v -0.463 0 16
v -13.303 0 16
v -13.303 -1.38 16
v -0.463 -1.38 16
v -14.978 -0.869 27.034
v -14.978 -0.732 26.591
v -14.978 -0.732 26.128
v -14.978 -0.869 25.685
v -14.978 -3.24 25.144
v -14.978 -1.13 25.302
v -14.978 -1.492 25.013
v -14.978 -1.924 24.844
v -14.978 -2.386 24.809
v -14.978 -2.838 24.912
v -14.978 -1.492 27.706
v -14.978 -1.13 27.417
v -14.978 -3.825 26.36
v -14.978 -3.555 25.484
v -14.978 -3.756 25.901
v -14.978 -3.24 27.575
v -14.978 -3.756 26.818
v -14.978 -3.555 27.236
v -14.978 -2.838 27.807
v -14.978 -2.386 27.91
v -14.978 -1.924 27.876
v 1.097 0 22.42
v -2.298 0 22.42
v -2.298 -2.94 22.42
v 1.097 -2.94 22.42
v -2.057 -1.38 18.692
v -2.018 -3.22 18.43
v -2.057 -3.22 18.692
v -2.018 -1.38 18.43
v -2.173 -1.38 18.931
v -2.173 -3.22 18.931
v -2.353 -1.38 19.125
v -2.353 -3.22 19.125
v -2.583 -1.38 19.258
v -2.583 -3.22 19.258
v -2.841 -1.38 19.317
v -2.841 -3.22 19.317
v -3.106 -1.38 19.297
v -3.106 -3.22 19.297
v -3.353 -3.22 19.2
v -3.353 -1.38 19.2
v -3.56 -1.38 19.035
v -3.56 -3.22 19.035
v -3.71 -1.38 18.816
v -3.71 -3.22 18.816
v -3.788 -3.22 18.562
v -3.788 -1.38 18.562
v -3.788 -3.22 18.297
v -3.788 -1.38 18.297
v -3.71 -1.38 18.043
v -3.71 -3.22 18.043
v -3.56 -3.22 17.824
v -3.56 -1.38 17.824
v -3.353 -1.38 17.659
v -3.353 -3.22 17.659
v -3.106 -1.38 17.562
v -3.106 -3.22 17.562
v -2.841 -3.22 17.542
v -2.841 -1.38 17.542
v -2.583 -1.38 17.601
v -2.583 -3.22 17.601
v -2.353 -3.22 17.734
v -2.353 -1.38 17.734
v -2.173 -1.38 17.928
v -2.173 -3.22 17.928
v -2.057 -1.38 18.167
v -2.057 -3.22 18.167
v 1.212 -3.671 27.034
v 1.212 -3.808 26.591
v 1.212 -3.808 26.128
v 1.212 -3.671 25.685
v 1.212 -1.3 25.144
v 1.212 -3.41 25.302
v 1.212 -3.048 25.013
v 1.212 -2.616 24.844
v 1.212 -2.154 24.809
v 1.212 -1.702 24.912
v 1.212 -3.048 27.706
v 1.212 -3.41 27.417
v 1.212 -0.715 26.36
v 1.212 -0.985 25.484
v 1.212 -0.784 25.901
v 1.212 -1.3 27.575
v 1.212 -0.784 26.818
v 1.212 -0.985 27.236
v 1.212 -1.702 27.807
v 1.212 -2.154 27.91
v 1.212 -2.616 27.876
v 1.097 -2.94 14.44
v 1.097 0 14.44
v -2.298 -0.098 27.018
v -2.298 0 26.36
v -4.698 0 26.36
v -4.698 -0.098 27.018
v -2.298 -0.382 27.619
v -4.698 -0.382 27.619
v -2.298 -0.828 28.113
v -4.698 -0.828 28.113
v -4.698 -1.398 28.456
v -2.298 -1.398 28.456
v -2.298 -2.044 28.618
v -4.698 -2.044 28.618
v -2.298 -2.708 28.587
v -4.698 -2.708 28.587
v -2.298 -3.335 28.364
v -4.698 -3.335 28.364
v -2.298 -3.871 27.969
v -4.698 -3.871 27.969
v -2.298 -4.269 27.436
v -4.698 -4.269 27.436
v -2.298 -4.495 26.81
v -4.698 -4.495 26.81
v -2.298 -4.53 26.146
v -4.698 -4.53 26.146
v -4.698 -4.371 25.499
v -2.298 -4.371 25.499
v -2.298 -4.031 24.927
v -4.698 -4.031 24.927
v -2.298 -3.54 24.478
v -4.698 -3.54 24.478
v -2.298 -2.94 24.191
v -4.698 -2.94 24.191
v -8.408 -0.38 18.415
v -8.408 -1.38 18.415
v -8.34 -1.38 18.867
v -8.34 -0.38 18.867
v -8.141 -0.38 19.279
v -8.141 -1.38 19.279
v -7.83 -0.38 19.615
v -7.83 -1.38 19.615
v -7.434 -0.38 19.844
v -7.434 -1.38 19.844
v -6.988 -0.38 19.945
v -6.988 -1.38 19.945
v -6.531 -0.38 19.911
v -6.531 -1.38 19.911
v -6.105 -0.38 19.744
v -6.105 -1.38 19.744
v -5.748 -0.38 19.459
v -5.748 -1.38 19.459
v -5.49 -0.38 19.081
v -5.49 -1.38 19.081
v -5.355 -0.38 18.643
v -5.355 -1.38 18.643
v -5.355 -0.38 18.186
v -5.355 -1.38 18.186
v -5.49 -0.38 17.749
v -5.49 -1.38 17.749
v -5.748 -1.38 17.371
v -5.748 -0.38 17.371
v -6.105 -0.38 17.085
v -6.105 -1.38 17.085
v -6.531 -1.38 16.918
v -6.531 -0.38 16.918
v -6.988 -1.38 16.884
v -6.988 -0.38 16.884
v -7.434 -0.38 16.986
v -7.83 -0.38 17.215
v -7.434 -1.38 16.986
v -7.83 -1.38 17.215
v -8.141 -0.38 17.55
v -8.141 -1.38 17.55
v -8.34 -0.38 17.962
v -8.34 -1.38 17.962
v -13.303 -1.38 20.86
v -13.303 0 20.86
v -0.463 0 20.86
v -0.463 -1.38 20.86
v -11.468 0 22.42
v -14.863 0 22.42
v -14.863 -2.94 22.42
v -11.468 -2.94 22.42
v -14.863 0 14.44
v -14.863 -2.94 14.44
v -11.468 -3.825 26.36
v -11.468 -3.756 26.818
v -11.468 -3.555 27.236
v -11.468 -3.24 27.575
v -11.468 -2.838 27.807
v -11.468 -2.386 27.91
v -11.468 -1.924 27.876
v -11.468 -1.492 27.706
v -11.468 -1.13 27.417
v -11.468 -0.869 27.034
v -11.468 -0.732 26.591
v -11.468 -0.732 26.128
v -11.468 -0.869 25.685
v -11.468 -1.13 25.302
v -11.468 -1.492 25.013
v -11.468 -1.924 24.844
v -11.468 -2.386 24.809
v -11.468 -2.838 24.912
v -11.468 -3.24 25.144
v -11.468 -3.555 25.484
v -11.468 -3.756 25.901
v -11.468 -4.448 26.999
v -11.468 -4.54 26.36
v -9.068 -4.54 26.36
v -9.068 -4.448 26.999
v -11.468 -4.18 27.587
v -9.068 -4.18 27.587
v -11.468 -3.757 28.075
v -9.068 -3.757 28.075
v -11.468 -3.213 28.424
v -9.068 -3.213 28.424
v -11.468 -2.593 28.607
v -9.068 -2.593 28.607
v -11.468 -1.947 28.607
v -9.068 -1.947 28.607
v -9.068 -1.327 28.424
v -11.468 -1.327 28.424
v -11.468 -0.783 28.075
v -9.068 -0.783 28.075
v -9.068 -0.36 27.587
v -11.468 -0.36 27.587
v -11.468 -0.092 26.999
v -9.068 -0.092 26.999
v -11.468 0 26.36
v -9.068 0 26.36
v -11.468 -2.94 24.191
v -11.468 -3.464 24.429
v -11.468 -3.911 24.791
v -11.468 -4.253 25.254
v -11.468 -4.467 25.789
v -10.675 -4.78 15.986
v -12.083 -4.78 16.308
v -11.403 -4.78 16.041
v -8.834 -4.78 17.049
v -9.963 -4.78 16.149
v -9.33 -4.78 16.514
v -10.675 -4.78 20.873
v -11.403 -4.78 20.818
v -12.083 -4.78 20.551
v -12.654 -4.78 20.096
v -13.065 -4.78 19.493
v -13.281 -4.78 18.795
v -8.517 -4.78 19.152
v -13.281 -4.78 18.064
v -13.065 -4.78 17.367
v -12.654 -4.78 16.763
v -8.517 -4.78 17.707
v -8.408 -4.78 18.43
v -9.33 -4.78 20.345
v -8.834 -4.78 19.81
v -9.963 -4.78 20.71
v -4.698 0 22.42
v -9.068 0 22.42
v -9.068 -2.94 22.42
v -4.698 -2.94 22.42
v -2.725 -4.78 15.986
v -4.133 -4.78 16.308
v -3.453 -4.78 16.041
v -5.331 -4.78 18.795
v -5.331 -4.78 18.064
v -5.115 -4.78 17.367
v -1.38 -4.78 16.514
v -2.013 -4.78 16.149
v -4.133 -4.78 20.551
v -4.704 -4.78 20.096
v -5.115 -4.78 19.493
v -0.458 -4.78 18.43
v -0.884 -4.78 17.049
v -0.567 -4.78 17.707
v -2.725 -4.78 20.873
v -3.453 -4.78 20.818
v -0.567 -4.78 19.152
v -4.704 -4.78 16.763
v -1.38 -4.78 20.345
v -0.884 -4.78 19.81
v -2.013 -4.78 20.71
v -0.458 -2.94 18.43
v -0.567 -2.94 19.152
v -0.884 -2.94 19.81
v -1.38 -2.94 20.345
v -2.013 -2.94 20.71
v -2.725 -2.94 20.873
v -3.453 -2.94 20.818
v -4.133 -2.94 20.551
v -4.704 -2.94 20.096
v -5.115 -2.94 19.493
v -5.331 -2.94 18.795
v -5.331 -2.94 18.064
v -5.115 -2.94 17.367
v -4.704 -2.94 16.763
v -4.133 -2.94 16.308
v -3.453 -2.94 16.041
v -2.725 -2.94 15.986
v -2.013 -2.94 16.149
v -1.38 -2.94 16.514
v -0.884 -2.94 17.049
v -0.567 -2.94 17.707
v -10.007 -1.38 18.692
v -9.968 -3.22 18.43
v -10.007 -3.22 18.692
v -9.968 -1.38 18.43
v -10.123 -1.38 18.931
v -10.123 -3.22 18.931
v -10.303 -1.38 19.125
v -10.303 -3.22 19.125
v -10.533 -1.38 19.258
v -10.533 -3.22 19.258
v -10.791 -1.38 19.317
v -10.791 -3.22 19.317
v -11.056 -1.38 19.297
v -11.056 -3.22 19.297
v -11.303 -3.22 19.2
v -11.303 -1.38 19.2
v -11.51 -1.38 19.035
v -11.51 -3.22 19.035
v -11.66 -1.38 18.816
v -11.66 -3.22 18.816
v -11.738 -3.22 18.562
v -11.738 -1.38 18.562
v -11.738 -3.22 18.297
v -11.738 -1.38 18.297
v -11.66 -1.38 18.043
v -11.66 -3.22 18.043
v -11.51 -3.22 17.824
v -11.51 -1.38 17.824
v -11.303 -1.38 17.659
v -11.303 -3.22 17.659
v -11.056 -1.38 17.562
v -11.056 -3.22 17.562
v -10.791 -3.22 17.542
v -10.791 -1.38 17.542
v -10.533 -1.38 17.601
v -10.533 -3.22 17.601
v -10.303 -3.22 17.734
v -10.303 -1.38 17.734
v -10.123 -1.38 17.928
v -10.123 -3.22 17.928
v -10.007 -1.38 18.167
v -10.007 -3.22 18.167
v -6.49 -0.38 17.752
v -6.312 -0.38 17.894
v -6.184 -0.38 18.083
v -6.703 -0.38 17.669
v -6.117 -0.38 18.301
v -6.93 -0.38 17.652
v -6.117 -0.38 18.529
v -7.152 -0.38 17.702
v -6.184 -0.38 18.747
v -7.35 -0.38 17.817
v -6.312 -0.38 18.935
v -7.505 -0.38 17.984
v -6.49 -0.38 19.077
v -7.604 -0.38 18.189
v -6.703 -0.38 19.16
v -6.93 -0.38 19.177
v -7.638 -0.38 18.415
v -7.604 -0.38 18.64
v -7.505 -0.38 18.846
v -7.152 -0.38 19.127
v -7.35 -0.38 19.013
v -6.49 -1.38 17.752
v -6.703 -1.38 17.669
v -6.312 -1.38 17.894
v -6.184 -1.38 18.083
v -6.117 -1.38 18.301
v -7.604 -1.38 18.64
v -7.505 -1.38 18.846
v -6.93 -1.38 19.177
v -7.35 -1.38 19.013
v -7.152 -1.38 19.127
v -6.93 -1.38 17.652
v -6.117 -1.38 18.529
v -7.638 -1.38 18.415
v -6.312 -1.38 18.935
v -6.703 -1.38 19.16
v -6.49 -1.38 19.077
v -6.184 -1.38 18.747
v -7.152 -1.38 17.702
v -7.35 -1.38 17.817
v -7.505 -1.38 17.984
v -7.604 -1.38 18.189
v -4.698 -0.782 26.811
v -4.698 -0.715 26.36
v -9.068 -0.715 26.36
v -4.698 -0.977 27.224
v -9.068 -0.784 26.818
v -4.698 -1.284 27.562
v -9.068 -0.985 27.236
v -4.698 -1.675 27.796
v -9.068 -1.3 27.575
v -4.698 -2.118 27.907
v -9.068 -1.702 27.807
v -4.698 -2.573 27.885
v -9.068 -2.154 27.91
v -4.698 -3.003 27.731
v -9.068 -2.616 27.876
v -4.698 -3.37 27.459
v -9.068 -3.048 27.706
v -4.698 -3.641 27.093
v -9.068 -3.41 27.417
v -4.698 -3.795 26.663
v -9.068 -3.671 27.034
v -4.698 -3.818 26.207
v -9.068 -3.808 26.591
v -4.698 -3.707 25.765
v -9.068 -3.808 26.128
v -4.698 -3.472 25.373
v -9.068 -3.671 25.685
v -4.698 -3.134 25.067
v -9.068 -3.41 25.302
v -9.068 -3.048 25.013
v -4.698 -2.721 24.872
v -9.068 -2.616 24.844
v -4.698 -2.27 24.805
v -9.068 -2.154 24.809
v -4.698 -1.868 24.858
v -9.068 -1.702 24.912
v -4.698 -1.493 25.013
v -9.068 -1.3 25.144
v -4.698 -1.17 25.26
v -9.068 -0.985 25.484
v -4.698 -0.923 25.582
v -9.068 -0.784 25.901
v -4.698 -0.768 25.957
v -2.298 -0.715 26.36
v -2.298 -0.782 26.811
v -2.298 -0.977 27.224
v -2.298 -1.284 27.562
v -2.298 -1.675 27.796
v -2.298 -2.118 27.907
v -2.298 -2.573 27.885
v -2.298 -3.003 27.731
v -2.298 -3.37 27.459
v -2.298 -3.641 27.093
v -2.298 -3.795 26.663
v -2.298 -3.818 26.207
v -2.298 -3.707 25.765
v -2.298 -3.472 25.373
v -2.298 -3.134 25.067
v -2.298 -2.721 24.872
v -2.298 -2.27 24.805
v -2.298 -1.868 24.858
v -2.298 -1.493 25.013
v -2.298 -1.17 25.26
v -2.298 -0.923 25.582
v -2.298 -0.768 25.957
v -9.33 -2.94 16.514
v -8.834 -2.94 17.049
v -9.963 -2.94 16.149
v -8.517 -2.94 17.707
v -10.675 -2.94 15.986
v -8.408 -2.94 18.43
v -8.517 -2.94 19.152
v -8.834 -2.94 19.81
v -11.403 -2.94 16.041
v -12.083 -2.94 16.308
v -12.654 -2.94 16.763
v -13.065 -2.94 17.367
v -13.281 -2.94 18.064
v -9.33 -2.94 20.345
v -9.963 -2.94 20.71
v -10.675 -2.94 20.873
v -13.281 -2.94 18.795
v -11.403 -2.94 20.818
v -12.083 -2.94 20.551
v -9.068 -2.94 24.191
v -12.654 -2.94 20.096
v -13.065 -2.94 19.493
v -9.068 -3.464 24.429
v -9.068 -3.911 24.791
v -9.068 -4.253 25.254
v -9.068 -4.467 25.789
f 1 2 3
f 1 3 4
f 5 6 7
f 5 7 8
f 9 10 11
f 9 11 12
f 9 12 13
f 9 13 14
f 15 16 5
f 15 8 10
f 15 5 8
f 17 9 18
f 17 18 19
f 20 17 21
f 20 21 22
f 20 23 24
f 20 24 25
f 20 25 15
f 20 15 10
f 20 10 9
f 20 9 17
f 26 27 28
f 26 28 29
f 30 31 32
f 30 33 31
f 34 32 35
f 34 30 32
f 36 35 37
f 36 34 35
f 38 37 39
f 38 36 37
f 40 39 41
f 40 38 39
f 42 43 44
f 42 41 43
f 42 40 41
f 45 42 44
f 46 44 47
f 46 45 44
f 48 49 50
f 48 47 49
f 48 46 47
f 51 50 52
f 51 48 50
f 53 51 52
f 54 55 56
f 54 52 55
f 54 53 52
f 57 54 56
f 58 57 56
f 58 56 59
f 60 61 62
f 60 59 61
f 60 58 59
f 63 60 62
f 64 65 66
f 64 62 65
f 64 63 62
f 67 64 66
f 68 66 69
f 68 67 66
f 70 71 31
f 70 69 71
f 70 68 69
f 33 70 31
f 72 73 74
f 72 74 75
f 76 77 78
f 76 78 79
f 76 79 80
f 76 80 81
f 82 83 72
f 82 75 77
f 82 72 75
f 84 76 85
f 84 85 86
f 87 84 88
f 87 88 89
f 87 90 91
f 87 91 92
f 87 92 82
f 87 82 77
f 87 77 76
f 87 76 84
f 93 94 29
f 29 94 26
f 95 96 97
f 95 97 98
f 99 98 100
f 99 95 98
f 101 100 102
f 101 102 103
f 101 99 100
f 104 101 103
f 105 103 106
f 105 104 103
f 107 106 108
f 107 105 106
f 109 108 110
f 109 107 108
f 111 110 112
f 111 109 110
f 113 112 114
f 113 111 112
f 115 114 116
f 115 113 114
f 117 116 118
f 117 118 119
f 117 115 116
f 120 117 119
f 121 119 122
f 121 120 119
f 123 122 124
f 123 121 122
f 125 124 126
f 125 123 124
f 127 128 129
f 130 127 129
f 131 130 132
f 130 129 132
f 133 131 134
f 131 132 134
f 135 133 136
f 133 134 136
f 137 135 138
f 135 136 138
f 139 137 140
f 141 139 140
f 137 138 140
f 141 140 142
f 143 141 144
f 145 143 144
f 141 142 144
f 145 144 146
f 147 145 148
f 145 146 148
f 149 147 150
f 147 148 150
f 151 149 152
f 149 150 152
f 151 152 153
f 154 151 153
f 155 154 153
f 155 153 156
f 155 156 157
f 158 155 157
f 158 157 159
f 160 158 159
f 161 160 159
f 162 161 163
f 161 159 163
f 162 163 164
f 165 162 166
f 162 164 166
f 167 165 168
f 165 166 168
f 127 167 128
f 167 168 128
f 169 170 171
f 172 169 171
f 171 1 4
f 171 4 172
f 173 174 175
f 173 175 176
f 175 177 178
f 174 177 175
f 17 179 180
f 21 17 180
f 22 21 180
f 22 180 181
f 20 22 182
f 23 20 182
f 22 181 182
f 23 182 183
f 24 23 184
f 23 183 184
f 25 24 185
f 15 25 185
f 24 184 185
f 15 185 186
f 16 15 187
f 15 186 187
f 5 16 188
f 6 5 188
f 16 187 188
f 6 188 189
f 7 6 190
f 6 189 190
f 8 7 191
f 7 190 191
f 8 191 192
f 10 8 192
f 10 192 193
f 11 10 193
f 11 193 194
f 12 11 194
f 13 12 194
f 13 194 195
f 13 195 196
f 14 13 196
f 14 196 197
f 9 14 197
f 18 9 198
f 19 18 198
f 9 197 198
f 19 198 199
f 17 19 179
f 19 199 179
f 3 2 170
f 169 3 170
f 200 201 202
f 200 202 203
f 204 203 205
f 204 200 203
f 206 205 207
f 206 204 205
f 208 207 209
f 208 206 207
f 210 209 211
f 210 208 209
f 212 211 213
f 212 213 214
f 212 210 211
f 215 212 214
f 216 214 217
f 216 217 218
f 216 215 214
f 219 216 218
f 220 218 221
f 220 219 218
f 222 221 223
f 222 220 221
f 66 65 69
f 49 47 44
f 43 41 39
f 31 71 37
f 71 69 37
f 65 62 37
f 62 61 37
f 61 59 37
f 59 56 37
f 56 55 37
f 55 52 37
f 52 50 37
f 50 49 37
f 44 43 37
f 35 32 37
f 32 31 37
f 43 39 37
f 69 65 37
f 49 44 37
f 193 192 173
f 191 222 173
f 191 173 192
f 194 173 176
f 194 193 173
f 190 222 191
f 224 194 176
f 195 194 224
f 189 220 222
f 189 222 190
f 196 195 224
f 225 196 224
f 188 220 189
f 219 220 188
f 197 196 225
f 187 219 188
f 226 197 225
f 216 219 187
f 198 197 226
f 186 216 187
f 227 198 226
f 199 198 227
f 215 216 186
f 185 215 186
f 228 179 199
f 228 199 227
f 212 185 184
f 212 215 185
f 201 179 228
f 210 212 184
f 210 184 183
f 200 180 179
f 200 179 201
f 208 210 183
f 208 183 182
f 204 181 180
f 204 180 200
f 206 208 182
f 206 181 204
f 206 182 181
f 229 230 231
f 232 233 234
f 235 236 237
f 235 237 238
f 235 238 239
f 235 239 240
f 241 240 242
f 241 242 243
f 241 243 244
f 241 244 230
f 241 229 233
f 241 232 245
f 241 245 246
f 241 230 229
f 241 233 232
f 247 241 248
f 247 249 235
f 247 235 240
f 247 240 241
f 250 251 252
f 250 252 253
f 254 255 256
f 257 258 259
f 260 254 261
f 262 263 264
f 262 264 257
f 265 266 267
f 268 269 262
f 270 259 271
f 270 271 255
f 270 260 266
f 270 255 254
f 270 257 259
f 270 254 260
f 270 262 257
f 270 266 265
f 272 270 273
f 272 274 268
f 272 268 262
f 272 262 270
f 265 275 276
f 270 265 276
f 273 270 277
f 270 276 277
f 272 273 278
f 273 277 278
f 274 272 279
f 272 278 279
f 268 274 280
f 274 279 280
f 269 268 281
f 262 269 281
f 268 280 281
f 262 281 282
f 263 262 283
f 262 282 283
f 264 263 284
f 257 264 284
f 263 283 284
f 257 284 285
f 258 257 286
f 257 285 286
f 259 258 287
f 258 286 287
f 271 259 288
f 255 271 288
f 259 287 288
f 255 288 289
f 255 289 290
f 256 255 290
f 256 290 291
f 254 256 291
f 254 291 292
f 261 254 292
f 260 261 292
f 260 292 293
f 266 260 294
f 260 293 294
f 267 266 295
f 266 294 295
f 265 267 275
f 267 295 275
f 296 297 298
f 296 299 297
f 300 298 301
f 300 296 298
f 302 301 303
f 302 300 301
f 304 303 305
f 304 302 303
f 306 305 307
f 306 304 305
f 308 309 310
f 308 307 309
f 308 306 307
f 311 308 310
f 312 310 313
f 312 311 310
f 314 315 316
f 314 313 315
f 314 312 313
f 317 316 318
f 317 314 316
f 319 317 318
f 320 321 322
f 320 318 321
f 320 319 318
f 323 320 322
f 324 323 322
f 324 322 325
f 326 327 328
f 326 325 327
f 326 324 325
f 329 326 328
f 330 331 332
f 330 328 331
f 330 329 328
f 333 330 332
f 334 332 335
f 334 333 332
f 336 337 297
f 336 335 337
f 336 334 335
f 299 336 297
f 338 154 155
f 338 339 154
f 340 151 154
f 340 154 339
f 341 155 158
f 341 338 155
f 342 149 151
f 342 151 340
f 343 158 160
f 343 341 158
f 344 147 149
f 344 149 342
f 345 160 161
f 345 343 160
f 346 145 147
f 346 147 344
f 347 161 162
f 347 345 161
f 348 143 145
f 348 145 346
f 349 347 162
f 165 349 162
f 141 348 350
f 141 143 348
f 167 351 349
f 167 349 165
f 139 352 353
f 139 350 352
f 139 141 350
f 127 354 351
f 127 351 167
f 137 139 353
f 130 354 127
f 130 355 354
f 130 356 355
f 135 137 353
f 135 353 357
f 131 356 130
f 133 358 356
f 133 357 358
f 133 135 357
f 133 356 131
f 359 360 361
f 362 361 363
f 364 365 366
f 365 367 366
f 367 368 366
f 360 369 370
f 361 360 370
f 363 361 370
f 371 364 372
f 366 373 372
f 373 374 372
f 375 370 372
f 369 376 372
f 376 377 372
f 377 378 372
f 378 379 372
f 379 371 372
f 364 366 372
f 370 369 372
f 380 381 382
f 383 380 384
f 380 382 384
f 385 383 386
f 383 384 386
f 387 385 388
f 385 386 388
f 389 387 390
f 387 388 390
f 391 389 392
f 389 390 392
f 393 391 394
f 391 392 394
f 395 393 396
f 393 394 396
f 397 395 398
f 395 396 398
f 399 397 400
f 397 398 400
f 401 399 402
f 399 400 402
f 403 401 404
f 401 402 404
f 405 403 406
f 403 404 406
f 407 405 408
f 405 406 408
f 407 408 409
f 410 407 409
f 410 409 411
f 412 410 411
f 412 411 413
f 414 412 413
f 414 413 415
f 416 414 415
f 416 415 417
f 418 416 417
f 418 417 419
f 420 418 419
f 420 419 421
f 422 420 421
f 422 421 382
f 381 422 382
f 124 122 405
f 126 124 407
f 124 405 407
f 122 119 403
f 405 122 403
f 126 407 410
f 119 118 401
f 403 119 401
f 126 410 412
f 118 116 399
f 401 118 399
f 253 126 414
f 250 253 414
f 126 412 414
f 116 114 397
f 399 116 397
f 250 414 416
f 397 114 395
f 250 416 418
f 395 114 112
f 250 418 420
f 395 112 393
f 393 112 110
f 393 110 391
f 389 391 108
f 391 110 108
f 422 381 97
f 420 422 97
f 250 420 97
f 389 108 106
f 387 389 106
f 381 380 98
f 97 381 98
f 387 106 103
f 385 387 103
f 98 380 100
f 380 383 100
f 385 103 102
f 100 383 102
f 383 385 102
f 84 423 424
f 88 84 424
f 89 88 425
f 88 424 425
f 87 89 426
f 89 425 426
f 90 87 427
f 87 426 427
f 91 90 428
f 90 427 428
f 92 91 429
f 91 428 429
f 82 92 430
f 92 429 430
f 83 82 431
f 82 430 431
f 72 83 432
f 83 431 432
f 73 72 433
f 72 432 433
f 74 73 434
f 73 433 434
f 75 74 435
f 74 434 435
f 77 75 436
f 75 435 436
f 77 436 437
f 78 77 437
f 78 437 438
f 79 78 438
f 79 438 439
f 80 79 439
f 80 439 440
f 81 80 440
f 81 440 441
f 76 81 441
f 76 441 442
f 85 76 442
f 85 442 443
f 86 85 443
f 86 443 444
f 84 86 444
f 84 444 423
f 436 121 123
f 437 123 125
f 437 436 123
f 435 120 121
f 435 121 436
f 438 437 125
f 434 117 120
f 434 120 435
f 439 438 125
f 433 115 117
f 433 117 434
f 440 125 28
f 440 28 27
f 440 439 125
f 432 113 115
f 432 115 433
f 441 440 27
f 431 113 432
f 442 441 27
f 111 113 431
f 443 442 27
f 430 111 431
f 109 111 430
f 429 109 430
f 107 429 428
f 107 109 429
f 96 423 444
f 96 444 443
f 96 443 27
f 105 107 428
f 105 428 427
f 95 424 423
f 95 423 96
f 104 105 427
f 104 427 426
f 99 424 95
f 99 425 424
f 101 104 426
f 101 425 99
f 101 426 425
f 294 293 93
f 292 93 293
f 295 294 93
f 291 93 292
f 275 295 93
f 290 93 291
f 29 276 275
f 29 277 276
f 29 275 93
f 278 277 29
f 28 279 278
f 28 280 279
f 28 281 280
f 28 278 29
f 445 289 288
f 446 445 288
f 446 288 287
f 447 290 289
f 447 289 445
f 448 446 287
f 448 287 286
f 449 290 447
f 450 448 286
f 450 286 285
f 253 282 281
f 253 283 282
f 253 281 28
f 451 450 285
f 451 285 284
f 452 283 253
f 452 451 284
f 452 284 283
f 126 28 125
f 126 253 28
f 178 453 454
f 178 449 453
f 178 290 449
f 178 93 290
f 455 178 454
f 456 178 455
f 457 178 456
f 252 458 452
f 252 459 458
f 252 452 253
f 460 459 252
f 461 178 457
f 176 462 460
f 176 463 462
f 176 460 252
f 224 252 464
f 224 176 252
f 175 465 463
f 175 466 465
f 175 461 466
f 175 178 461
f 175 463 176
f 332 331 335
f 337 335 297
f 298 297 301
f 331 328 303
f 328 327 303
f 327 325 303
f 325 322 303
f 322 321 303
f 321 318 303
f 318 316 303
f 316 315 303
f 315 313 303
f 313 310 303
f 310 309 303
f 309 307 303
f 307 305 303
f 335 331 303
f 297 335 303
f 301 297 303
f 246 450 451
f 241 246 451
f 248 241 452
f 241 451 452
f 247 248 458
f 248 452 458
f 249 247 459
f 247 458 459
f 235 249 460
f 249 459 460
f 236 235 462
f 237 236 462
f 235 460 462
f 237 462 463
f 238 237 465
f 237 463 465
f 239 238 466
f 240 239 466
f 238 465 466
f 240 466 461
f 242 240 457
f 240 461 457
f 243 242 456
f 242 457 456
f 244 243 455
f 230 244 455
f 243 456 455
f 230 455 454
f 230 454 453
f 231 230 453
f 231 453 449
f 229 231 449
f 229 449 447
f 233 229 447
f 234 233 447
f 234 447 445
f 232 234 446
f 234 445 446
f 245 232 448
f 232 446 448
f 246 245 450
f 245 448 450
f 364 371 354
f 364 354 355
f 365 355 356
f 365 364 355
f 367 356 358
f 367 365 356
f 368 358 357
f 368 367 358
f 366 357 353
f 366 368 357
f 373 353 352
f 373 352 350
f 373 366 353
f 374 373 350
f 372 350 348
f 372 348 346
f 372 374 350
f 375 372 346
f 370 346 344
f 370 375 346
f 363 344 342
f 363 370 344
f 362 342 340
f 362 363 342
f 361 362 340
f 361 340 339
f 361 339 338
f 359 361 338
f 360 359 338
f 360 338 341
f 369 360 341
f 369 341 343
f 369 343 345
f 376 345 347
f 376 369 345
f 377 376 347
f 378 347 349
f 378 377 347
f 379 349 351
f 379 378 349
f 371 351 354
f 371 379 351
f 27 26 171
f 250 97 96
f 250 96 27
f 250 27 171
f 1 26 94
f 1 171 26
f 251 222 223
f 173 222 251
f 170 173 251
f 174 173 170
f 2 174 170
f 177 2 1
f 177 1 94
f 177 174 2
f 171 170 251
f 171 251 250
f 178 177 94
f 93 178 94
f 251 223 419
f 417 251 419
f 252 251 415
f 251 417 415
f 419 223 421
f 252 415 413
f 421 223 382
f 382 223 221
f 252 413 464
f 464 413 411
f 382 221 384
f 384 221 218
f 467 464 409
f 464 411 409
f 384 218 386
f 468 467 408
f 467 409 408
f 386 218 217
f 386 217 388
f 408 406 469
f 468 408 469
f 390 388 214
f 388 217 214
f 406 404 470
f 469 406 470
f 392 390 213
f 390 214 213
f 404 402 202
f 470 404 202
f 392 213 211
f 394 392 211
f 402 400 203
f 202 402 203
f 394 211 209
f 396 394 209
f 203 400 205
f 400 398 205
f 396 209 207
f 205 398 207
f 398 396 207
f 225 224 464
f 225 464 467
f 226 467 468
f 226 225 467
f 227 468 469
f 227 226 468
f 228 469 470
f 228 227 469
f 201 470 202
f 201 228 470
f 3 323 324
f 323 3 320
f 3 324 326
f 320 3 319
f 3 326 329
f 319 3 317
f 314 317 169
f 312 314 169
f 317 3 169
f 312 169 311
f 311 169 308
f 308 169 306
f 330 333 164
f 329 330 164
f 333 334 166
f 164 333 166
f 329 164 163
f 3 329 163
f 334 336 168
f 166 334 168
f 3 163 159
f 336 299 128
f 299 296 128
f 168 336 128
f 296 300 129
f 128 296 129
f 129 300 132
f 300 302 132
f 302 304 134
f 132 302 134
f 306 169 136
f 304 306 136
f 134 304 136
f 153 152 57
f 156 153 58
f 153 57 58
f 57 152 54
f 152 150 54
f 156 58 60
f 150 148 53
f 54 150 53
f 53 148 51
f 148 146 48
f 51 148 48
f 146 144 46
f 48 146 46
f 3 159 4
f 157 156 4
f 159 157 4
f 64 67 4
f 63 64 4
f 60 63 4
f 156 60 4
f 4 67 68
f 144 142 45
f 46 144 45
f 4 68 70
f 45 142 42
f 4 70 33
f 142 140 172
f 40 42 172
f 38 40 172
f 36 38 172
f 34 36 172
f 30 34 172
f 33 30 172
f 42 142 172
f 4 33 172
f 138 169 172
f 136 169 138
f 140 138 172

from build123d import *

# Parameters (mm, degrees)
F0_W      = 15.96
F0_H      = 7.98
F1_DEPTH  = 2.94
F2_R      = 2.45
F3_DEPTH  = 1.84
F4_T      = -1.56
F5_R      = 1.535
F5_R_2    = 0.765
F6_DEPTH  = 1
F8_DEPTH  = 1.67
F10_DEPTH = 2.4
F12_DEPTH = 2.4
F13_R     = 1.555
F14_DEPTH = 10.28
F15_R     = 1.555
F16_DEPTH = 3.51


with BuildPart() as f1:
    # F0 (on Front) → F1 (new body)
    with BuildSketch(Plane.XZ):
        with Locations((-6.8829571828, 18.429612627)):
            Rectangle(F0_W, F0_H)
    extrude(amount=F1_DEPTH)

    # F2 (on face) → F3 (join)
    with BuildSketch(Plane.XZ.offset(2.94)):
        with Locations((-10.8579571828, 18.429612627)):
            Circle(F2_R)
        with Locations((-2.9079571828, 18.429612627)):
            Circle(F2_R)
    extrude(amount=F3_DEPTH)

    # F4
    f4_openings = [f1.faces().sort_by_distance(p)[0] for p in [
        (-6.882957, 0, 18.429613),
    ]]
    offset(amount=F4_T, openings=f4_openings, kind=Kind.INTERSECTION)

    # F5 (on face) → F6 (join)
    with BuildSketch(Plane(origin=(0, -1.38, 0), x_dir=(-1, 0, 0), z_dir=(0, 1, 0))):
        with Locations((6.8729571828, 18.414612627)):
            Circle(F5_R)
        with Locations((6.8729571828, 18.414612627)):
            Circle(F5_R_2, mode=Mode.SUBTRACT)
    extrude(amount=F6_DEPTH)

    # F7 (on face) → F8 (join)
    with BuildSketch(Plane.XY.offset(22.419612627)):
        Polygon((-9.0679571828, -2.94), (-9.0679571828, -1.47), (-9.0679571828, 0), (-11.4679571828, 0), (-11.4679571828, -2.94), align=None)
        Polygon((-4.6979571828, 0), (-4.6979571828, -1.47), (-4.6979571828, -2.94), (-2.2979571828, -2.94), (-2.2979571828, 0), align=None)
    extrude(amount=F8_DEPTH)

    # F9 (on face) → F10 (join)
    with BuildSketch(Plane.YZ.offset(-2.2979571828)):
        with BuildLine():
            Line((-2.27, 24.089612627), (0, 24.089612627))
            Line((0, 24.089612627), (0, 26.359612627))
            ThreePointArc((0, 26.359612627), (-0.6648676067, 24.7544802337), (-2.27, 24.089612627))
        make_face()
        with BuildLine():
            ThreePointArc((-2.94, 24.1907419532), (-2.6087946061, 24.115037341), (-2.27, 24.089612627))
            ThreePointArc((-2.27, 24.089612627), (-0.6648676067, 24.7544802337), (0, 26.359612627))
            ThreePointArc((0, 26.359612627), (-3.6175904422, 28.1863309961), (-2.94, 24.1907419532))
        make_face()
        with BuildLine():
            ThreePointArc((-0.715, 26.359612627), (-1.1704489553, 25.2600615823), (-2.27, 24.804612627))
            ThreePointArc((-2.27, 24.804612627), (-3.3695510447, 27.4591636718), (-0.715, 26.359612627))
        make_face(mode=Mode.SUBTRACT)
        with BuildLine():
            Line((-2.94, 24.089612627), (-2.27, 24.089612627))
            ThreePointArc((-2.27, 24.089612627), (-2.6087946061, 24.115037341), (-2.94, 24.1907419532))
            Line((-2.94, 24.1907419532), (-2.94, 24.089612627))
        make_face()
    extrude(amount=-F10_DEPTH)

    # F11 (on face) → F12 (join)
    with BuildSketch(Plane(origin=(-11.4679571828, 0, 0), x_dir=(0, -1, 0), z_dir=(-1, 0, 0))):
        with BuildLine():
            ThreePointArc((0, 26.359612627), (0.6648676067, 24.7544802337), (2.27, 24.089612627))
            ThreePointArc((2.27, 24.089612627), (2.6087946061, 24.115037341), (2.94, 24.1907419532))
            ThreePointArc((2.94, 24.1907419532), (4.0967183691, 25.0120221848), (4.54, 26.359612627))
            ThreePointArc((4.54, 26.359612627), (2.27, 28.629612627), (0, 26.359612627))
        make_face()
        with BuildLine():
            ThreePointArc((2.94, 24.1907419532), (2.6087946061, 24.115037341), (2.27, 24.089612627))
            Line((2.27, 24.089612627), (2.94, 24.089612627))
            Line((2.94, 24.089612627), (2.94, 24.1907419532))
        make_face()
        with BuildLine():
            Line((0, 26.359612627), (0, 24.089612627))
            Line((0, 24.089612627), (2.27, 24.089612627))
            ThreePointArc((2.27, 24.089612627), (0.6648676067, 24.7544802337), (0, 26.359612627))
        make_face()
    extrude(amount=-F12_DEPTH)

    # F13 (on face) → F14 (join)
    with BuildSketch(Plane.YZ.offset(-9.0679571828)):
        with Locations((-2.27, 26.359612627)):
            Circle(F13_R)
    extrude(amount=F14_DEPTH)

    # F15 (on face) → F16 (join)
    with BuildSketch(Plane(origin=(-11.4679571828, 0, 0), x_dir=(0, -1, 0), z_dir=(-1, 0, 0))):
        with Locations((2.27, 26.359612627)):
            Circle(F15_R)
    extrude(amount=F16_DEPTH)


solid = f1.part
